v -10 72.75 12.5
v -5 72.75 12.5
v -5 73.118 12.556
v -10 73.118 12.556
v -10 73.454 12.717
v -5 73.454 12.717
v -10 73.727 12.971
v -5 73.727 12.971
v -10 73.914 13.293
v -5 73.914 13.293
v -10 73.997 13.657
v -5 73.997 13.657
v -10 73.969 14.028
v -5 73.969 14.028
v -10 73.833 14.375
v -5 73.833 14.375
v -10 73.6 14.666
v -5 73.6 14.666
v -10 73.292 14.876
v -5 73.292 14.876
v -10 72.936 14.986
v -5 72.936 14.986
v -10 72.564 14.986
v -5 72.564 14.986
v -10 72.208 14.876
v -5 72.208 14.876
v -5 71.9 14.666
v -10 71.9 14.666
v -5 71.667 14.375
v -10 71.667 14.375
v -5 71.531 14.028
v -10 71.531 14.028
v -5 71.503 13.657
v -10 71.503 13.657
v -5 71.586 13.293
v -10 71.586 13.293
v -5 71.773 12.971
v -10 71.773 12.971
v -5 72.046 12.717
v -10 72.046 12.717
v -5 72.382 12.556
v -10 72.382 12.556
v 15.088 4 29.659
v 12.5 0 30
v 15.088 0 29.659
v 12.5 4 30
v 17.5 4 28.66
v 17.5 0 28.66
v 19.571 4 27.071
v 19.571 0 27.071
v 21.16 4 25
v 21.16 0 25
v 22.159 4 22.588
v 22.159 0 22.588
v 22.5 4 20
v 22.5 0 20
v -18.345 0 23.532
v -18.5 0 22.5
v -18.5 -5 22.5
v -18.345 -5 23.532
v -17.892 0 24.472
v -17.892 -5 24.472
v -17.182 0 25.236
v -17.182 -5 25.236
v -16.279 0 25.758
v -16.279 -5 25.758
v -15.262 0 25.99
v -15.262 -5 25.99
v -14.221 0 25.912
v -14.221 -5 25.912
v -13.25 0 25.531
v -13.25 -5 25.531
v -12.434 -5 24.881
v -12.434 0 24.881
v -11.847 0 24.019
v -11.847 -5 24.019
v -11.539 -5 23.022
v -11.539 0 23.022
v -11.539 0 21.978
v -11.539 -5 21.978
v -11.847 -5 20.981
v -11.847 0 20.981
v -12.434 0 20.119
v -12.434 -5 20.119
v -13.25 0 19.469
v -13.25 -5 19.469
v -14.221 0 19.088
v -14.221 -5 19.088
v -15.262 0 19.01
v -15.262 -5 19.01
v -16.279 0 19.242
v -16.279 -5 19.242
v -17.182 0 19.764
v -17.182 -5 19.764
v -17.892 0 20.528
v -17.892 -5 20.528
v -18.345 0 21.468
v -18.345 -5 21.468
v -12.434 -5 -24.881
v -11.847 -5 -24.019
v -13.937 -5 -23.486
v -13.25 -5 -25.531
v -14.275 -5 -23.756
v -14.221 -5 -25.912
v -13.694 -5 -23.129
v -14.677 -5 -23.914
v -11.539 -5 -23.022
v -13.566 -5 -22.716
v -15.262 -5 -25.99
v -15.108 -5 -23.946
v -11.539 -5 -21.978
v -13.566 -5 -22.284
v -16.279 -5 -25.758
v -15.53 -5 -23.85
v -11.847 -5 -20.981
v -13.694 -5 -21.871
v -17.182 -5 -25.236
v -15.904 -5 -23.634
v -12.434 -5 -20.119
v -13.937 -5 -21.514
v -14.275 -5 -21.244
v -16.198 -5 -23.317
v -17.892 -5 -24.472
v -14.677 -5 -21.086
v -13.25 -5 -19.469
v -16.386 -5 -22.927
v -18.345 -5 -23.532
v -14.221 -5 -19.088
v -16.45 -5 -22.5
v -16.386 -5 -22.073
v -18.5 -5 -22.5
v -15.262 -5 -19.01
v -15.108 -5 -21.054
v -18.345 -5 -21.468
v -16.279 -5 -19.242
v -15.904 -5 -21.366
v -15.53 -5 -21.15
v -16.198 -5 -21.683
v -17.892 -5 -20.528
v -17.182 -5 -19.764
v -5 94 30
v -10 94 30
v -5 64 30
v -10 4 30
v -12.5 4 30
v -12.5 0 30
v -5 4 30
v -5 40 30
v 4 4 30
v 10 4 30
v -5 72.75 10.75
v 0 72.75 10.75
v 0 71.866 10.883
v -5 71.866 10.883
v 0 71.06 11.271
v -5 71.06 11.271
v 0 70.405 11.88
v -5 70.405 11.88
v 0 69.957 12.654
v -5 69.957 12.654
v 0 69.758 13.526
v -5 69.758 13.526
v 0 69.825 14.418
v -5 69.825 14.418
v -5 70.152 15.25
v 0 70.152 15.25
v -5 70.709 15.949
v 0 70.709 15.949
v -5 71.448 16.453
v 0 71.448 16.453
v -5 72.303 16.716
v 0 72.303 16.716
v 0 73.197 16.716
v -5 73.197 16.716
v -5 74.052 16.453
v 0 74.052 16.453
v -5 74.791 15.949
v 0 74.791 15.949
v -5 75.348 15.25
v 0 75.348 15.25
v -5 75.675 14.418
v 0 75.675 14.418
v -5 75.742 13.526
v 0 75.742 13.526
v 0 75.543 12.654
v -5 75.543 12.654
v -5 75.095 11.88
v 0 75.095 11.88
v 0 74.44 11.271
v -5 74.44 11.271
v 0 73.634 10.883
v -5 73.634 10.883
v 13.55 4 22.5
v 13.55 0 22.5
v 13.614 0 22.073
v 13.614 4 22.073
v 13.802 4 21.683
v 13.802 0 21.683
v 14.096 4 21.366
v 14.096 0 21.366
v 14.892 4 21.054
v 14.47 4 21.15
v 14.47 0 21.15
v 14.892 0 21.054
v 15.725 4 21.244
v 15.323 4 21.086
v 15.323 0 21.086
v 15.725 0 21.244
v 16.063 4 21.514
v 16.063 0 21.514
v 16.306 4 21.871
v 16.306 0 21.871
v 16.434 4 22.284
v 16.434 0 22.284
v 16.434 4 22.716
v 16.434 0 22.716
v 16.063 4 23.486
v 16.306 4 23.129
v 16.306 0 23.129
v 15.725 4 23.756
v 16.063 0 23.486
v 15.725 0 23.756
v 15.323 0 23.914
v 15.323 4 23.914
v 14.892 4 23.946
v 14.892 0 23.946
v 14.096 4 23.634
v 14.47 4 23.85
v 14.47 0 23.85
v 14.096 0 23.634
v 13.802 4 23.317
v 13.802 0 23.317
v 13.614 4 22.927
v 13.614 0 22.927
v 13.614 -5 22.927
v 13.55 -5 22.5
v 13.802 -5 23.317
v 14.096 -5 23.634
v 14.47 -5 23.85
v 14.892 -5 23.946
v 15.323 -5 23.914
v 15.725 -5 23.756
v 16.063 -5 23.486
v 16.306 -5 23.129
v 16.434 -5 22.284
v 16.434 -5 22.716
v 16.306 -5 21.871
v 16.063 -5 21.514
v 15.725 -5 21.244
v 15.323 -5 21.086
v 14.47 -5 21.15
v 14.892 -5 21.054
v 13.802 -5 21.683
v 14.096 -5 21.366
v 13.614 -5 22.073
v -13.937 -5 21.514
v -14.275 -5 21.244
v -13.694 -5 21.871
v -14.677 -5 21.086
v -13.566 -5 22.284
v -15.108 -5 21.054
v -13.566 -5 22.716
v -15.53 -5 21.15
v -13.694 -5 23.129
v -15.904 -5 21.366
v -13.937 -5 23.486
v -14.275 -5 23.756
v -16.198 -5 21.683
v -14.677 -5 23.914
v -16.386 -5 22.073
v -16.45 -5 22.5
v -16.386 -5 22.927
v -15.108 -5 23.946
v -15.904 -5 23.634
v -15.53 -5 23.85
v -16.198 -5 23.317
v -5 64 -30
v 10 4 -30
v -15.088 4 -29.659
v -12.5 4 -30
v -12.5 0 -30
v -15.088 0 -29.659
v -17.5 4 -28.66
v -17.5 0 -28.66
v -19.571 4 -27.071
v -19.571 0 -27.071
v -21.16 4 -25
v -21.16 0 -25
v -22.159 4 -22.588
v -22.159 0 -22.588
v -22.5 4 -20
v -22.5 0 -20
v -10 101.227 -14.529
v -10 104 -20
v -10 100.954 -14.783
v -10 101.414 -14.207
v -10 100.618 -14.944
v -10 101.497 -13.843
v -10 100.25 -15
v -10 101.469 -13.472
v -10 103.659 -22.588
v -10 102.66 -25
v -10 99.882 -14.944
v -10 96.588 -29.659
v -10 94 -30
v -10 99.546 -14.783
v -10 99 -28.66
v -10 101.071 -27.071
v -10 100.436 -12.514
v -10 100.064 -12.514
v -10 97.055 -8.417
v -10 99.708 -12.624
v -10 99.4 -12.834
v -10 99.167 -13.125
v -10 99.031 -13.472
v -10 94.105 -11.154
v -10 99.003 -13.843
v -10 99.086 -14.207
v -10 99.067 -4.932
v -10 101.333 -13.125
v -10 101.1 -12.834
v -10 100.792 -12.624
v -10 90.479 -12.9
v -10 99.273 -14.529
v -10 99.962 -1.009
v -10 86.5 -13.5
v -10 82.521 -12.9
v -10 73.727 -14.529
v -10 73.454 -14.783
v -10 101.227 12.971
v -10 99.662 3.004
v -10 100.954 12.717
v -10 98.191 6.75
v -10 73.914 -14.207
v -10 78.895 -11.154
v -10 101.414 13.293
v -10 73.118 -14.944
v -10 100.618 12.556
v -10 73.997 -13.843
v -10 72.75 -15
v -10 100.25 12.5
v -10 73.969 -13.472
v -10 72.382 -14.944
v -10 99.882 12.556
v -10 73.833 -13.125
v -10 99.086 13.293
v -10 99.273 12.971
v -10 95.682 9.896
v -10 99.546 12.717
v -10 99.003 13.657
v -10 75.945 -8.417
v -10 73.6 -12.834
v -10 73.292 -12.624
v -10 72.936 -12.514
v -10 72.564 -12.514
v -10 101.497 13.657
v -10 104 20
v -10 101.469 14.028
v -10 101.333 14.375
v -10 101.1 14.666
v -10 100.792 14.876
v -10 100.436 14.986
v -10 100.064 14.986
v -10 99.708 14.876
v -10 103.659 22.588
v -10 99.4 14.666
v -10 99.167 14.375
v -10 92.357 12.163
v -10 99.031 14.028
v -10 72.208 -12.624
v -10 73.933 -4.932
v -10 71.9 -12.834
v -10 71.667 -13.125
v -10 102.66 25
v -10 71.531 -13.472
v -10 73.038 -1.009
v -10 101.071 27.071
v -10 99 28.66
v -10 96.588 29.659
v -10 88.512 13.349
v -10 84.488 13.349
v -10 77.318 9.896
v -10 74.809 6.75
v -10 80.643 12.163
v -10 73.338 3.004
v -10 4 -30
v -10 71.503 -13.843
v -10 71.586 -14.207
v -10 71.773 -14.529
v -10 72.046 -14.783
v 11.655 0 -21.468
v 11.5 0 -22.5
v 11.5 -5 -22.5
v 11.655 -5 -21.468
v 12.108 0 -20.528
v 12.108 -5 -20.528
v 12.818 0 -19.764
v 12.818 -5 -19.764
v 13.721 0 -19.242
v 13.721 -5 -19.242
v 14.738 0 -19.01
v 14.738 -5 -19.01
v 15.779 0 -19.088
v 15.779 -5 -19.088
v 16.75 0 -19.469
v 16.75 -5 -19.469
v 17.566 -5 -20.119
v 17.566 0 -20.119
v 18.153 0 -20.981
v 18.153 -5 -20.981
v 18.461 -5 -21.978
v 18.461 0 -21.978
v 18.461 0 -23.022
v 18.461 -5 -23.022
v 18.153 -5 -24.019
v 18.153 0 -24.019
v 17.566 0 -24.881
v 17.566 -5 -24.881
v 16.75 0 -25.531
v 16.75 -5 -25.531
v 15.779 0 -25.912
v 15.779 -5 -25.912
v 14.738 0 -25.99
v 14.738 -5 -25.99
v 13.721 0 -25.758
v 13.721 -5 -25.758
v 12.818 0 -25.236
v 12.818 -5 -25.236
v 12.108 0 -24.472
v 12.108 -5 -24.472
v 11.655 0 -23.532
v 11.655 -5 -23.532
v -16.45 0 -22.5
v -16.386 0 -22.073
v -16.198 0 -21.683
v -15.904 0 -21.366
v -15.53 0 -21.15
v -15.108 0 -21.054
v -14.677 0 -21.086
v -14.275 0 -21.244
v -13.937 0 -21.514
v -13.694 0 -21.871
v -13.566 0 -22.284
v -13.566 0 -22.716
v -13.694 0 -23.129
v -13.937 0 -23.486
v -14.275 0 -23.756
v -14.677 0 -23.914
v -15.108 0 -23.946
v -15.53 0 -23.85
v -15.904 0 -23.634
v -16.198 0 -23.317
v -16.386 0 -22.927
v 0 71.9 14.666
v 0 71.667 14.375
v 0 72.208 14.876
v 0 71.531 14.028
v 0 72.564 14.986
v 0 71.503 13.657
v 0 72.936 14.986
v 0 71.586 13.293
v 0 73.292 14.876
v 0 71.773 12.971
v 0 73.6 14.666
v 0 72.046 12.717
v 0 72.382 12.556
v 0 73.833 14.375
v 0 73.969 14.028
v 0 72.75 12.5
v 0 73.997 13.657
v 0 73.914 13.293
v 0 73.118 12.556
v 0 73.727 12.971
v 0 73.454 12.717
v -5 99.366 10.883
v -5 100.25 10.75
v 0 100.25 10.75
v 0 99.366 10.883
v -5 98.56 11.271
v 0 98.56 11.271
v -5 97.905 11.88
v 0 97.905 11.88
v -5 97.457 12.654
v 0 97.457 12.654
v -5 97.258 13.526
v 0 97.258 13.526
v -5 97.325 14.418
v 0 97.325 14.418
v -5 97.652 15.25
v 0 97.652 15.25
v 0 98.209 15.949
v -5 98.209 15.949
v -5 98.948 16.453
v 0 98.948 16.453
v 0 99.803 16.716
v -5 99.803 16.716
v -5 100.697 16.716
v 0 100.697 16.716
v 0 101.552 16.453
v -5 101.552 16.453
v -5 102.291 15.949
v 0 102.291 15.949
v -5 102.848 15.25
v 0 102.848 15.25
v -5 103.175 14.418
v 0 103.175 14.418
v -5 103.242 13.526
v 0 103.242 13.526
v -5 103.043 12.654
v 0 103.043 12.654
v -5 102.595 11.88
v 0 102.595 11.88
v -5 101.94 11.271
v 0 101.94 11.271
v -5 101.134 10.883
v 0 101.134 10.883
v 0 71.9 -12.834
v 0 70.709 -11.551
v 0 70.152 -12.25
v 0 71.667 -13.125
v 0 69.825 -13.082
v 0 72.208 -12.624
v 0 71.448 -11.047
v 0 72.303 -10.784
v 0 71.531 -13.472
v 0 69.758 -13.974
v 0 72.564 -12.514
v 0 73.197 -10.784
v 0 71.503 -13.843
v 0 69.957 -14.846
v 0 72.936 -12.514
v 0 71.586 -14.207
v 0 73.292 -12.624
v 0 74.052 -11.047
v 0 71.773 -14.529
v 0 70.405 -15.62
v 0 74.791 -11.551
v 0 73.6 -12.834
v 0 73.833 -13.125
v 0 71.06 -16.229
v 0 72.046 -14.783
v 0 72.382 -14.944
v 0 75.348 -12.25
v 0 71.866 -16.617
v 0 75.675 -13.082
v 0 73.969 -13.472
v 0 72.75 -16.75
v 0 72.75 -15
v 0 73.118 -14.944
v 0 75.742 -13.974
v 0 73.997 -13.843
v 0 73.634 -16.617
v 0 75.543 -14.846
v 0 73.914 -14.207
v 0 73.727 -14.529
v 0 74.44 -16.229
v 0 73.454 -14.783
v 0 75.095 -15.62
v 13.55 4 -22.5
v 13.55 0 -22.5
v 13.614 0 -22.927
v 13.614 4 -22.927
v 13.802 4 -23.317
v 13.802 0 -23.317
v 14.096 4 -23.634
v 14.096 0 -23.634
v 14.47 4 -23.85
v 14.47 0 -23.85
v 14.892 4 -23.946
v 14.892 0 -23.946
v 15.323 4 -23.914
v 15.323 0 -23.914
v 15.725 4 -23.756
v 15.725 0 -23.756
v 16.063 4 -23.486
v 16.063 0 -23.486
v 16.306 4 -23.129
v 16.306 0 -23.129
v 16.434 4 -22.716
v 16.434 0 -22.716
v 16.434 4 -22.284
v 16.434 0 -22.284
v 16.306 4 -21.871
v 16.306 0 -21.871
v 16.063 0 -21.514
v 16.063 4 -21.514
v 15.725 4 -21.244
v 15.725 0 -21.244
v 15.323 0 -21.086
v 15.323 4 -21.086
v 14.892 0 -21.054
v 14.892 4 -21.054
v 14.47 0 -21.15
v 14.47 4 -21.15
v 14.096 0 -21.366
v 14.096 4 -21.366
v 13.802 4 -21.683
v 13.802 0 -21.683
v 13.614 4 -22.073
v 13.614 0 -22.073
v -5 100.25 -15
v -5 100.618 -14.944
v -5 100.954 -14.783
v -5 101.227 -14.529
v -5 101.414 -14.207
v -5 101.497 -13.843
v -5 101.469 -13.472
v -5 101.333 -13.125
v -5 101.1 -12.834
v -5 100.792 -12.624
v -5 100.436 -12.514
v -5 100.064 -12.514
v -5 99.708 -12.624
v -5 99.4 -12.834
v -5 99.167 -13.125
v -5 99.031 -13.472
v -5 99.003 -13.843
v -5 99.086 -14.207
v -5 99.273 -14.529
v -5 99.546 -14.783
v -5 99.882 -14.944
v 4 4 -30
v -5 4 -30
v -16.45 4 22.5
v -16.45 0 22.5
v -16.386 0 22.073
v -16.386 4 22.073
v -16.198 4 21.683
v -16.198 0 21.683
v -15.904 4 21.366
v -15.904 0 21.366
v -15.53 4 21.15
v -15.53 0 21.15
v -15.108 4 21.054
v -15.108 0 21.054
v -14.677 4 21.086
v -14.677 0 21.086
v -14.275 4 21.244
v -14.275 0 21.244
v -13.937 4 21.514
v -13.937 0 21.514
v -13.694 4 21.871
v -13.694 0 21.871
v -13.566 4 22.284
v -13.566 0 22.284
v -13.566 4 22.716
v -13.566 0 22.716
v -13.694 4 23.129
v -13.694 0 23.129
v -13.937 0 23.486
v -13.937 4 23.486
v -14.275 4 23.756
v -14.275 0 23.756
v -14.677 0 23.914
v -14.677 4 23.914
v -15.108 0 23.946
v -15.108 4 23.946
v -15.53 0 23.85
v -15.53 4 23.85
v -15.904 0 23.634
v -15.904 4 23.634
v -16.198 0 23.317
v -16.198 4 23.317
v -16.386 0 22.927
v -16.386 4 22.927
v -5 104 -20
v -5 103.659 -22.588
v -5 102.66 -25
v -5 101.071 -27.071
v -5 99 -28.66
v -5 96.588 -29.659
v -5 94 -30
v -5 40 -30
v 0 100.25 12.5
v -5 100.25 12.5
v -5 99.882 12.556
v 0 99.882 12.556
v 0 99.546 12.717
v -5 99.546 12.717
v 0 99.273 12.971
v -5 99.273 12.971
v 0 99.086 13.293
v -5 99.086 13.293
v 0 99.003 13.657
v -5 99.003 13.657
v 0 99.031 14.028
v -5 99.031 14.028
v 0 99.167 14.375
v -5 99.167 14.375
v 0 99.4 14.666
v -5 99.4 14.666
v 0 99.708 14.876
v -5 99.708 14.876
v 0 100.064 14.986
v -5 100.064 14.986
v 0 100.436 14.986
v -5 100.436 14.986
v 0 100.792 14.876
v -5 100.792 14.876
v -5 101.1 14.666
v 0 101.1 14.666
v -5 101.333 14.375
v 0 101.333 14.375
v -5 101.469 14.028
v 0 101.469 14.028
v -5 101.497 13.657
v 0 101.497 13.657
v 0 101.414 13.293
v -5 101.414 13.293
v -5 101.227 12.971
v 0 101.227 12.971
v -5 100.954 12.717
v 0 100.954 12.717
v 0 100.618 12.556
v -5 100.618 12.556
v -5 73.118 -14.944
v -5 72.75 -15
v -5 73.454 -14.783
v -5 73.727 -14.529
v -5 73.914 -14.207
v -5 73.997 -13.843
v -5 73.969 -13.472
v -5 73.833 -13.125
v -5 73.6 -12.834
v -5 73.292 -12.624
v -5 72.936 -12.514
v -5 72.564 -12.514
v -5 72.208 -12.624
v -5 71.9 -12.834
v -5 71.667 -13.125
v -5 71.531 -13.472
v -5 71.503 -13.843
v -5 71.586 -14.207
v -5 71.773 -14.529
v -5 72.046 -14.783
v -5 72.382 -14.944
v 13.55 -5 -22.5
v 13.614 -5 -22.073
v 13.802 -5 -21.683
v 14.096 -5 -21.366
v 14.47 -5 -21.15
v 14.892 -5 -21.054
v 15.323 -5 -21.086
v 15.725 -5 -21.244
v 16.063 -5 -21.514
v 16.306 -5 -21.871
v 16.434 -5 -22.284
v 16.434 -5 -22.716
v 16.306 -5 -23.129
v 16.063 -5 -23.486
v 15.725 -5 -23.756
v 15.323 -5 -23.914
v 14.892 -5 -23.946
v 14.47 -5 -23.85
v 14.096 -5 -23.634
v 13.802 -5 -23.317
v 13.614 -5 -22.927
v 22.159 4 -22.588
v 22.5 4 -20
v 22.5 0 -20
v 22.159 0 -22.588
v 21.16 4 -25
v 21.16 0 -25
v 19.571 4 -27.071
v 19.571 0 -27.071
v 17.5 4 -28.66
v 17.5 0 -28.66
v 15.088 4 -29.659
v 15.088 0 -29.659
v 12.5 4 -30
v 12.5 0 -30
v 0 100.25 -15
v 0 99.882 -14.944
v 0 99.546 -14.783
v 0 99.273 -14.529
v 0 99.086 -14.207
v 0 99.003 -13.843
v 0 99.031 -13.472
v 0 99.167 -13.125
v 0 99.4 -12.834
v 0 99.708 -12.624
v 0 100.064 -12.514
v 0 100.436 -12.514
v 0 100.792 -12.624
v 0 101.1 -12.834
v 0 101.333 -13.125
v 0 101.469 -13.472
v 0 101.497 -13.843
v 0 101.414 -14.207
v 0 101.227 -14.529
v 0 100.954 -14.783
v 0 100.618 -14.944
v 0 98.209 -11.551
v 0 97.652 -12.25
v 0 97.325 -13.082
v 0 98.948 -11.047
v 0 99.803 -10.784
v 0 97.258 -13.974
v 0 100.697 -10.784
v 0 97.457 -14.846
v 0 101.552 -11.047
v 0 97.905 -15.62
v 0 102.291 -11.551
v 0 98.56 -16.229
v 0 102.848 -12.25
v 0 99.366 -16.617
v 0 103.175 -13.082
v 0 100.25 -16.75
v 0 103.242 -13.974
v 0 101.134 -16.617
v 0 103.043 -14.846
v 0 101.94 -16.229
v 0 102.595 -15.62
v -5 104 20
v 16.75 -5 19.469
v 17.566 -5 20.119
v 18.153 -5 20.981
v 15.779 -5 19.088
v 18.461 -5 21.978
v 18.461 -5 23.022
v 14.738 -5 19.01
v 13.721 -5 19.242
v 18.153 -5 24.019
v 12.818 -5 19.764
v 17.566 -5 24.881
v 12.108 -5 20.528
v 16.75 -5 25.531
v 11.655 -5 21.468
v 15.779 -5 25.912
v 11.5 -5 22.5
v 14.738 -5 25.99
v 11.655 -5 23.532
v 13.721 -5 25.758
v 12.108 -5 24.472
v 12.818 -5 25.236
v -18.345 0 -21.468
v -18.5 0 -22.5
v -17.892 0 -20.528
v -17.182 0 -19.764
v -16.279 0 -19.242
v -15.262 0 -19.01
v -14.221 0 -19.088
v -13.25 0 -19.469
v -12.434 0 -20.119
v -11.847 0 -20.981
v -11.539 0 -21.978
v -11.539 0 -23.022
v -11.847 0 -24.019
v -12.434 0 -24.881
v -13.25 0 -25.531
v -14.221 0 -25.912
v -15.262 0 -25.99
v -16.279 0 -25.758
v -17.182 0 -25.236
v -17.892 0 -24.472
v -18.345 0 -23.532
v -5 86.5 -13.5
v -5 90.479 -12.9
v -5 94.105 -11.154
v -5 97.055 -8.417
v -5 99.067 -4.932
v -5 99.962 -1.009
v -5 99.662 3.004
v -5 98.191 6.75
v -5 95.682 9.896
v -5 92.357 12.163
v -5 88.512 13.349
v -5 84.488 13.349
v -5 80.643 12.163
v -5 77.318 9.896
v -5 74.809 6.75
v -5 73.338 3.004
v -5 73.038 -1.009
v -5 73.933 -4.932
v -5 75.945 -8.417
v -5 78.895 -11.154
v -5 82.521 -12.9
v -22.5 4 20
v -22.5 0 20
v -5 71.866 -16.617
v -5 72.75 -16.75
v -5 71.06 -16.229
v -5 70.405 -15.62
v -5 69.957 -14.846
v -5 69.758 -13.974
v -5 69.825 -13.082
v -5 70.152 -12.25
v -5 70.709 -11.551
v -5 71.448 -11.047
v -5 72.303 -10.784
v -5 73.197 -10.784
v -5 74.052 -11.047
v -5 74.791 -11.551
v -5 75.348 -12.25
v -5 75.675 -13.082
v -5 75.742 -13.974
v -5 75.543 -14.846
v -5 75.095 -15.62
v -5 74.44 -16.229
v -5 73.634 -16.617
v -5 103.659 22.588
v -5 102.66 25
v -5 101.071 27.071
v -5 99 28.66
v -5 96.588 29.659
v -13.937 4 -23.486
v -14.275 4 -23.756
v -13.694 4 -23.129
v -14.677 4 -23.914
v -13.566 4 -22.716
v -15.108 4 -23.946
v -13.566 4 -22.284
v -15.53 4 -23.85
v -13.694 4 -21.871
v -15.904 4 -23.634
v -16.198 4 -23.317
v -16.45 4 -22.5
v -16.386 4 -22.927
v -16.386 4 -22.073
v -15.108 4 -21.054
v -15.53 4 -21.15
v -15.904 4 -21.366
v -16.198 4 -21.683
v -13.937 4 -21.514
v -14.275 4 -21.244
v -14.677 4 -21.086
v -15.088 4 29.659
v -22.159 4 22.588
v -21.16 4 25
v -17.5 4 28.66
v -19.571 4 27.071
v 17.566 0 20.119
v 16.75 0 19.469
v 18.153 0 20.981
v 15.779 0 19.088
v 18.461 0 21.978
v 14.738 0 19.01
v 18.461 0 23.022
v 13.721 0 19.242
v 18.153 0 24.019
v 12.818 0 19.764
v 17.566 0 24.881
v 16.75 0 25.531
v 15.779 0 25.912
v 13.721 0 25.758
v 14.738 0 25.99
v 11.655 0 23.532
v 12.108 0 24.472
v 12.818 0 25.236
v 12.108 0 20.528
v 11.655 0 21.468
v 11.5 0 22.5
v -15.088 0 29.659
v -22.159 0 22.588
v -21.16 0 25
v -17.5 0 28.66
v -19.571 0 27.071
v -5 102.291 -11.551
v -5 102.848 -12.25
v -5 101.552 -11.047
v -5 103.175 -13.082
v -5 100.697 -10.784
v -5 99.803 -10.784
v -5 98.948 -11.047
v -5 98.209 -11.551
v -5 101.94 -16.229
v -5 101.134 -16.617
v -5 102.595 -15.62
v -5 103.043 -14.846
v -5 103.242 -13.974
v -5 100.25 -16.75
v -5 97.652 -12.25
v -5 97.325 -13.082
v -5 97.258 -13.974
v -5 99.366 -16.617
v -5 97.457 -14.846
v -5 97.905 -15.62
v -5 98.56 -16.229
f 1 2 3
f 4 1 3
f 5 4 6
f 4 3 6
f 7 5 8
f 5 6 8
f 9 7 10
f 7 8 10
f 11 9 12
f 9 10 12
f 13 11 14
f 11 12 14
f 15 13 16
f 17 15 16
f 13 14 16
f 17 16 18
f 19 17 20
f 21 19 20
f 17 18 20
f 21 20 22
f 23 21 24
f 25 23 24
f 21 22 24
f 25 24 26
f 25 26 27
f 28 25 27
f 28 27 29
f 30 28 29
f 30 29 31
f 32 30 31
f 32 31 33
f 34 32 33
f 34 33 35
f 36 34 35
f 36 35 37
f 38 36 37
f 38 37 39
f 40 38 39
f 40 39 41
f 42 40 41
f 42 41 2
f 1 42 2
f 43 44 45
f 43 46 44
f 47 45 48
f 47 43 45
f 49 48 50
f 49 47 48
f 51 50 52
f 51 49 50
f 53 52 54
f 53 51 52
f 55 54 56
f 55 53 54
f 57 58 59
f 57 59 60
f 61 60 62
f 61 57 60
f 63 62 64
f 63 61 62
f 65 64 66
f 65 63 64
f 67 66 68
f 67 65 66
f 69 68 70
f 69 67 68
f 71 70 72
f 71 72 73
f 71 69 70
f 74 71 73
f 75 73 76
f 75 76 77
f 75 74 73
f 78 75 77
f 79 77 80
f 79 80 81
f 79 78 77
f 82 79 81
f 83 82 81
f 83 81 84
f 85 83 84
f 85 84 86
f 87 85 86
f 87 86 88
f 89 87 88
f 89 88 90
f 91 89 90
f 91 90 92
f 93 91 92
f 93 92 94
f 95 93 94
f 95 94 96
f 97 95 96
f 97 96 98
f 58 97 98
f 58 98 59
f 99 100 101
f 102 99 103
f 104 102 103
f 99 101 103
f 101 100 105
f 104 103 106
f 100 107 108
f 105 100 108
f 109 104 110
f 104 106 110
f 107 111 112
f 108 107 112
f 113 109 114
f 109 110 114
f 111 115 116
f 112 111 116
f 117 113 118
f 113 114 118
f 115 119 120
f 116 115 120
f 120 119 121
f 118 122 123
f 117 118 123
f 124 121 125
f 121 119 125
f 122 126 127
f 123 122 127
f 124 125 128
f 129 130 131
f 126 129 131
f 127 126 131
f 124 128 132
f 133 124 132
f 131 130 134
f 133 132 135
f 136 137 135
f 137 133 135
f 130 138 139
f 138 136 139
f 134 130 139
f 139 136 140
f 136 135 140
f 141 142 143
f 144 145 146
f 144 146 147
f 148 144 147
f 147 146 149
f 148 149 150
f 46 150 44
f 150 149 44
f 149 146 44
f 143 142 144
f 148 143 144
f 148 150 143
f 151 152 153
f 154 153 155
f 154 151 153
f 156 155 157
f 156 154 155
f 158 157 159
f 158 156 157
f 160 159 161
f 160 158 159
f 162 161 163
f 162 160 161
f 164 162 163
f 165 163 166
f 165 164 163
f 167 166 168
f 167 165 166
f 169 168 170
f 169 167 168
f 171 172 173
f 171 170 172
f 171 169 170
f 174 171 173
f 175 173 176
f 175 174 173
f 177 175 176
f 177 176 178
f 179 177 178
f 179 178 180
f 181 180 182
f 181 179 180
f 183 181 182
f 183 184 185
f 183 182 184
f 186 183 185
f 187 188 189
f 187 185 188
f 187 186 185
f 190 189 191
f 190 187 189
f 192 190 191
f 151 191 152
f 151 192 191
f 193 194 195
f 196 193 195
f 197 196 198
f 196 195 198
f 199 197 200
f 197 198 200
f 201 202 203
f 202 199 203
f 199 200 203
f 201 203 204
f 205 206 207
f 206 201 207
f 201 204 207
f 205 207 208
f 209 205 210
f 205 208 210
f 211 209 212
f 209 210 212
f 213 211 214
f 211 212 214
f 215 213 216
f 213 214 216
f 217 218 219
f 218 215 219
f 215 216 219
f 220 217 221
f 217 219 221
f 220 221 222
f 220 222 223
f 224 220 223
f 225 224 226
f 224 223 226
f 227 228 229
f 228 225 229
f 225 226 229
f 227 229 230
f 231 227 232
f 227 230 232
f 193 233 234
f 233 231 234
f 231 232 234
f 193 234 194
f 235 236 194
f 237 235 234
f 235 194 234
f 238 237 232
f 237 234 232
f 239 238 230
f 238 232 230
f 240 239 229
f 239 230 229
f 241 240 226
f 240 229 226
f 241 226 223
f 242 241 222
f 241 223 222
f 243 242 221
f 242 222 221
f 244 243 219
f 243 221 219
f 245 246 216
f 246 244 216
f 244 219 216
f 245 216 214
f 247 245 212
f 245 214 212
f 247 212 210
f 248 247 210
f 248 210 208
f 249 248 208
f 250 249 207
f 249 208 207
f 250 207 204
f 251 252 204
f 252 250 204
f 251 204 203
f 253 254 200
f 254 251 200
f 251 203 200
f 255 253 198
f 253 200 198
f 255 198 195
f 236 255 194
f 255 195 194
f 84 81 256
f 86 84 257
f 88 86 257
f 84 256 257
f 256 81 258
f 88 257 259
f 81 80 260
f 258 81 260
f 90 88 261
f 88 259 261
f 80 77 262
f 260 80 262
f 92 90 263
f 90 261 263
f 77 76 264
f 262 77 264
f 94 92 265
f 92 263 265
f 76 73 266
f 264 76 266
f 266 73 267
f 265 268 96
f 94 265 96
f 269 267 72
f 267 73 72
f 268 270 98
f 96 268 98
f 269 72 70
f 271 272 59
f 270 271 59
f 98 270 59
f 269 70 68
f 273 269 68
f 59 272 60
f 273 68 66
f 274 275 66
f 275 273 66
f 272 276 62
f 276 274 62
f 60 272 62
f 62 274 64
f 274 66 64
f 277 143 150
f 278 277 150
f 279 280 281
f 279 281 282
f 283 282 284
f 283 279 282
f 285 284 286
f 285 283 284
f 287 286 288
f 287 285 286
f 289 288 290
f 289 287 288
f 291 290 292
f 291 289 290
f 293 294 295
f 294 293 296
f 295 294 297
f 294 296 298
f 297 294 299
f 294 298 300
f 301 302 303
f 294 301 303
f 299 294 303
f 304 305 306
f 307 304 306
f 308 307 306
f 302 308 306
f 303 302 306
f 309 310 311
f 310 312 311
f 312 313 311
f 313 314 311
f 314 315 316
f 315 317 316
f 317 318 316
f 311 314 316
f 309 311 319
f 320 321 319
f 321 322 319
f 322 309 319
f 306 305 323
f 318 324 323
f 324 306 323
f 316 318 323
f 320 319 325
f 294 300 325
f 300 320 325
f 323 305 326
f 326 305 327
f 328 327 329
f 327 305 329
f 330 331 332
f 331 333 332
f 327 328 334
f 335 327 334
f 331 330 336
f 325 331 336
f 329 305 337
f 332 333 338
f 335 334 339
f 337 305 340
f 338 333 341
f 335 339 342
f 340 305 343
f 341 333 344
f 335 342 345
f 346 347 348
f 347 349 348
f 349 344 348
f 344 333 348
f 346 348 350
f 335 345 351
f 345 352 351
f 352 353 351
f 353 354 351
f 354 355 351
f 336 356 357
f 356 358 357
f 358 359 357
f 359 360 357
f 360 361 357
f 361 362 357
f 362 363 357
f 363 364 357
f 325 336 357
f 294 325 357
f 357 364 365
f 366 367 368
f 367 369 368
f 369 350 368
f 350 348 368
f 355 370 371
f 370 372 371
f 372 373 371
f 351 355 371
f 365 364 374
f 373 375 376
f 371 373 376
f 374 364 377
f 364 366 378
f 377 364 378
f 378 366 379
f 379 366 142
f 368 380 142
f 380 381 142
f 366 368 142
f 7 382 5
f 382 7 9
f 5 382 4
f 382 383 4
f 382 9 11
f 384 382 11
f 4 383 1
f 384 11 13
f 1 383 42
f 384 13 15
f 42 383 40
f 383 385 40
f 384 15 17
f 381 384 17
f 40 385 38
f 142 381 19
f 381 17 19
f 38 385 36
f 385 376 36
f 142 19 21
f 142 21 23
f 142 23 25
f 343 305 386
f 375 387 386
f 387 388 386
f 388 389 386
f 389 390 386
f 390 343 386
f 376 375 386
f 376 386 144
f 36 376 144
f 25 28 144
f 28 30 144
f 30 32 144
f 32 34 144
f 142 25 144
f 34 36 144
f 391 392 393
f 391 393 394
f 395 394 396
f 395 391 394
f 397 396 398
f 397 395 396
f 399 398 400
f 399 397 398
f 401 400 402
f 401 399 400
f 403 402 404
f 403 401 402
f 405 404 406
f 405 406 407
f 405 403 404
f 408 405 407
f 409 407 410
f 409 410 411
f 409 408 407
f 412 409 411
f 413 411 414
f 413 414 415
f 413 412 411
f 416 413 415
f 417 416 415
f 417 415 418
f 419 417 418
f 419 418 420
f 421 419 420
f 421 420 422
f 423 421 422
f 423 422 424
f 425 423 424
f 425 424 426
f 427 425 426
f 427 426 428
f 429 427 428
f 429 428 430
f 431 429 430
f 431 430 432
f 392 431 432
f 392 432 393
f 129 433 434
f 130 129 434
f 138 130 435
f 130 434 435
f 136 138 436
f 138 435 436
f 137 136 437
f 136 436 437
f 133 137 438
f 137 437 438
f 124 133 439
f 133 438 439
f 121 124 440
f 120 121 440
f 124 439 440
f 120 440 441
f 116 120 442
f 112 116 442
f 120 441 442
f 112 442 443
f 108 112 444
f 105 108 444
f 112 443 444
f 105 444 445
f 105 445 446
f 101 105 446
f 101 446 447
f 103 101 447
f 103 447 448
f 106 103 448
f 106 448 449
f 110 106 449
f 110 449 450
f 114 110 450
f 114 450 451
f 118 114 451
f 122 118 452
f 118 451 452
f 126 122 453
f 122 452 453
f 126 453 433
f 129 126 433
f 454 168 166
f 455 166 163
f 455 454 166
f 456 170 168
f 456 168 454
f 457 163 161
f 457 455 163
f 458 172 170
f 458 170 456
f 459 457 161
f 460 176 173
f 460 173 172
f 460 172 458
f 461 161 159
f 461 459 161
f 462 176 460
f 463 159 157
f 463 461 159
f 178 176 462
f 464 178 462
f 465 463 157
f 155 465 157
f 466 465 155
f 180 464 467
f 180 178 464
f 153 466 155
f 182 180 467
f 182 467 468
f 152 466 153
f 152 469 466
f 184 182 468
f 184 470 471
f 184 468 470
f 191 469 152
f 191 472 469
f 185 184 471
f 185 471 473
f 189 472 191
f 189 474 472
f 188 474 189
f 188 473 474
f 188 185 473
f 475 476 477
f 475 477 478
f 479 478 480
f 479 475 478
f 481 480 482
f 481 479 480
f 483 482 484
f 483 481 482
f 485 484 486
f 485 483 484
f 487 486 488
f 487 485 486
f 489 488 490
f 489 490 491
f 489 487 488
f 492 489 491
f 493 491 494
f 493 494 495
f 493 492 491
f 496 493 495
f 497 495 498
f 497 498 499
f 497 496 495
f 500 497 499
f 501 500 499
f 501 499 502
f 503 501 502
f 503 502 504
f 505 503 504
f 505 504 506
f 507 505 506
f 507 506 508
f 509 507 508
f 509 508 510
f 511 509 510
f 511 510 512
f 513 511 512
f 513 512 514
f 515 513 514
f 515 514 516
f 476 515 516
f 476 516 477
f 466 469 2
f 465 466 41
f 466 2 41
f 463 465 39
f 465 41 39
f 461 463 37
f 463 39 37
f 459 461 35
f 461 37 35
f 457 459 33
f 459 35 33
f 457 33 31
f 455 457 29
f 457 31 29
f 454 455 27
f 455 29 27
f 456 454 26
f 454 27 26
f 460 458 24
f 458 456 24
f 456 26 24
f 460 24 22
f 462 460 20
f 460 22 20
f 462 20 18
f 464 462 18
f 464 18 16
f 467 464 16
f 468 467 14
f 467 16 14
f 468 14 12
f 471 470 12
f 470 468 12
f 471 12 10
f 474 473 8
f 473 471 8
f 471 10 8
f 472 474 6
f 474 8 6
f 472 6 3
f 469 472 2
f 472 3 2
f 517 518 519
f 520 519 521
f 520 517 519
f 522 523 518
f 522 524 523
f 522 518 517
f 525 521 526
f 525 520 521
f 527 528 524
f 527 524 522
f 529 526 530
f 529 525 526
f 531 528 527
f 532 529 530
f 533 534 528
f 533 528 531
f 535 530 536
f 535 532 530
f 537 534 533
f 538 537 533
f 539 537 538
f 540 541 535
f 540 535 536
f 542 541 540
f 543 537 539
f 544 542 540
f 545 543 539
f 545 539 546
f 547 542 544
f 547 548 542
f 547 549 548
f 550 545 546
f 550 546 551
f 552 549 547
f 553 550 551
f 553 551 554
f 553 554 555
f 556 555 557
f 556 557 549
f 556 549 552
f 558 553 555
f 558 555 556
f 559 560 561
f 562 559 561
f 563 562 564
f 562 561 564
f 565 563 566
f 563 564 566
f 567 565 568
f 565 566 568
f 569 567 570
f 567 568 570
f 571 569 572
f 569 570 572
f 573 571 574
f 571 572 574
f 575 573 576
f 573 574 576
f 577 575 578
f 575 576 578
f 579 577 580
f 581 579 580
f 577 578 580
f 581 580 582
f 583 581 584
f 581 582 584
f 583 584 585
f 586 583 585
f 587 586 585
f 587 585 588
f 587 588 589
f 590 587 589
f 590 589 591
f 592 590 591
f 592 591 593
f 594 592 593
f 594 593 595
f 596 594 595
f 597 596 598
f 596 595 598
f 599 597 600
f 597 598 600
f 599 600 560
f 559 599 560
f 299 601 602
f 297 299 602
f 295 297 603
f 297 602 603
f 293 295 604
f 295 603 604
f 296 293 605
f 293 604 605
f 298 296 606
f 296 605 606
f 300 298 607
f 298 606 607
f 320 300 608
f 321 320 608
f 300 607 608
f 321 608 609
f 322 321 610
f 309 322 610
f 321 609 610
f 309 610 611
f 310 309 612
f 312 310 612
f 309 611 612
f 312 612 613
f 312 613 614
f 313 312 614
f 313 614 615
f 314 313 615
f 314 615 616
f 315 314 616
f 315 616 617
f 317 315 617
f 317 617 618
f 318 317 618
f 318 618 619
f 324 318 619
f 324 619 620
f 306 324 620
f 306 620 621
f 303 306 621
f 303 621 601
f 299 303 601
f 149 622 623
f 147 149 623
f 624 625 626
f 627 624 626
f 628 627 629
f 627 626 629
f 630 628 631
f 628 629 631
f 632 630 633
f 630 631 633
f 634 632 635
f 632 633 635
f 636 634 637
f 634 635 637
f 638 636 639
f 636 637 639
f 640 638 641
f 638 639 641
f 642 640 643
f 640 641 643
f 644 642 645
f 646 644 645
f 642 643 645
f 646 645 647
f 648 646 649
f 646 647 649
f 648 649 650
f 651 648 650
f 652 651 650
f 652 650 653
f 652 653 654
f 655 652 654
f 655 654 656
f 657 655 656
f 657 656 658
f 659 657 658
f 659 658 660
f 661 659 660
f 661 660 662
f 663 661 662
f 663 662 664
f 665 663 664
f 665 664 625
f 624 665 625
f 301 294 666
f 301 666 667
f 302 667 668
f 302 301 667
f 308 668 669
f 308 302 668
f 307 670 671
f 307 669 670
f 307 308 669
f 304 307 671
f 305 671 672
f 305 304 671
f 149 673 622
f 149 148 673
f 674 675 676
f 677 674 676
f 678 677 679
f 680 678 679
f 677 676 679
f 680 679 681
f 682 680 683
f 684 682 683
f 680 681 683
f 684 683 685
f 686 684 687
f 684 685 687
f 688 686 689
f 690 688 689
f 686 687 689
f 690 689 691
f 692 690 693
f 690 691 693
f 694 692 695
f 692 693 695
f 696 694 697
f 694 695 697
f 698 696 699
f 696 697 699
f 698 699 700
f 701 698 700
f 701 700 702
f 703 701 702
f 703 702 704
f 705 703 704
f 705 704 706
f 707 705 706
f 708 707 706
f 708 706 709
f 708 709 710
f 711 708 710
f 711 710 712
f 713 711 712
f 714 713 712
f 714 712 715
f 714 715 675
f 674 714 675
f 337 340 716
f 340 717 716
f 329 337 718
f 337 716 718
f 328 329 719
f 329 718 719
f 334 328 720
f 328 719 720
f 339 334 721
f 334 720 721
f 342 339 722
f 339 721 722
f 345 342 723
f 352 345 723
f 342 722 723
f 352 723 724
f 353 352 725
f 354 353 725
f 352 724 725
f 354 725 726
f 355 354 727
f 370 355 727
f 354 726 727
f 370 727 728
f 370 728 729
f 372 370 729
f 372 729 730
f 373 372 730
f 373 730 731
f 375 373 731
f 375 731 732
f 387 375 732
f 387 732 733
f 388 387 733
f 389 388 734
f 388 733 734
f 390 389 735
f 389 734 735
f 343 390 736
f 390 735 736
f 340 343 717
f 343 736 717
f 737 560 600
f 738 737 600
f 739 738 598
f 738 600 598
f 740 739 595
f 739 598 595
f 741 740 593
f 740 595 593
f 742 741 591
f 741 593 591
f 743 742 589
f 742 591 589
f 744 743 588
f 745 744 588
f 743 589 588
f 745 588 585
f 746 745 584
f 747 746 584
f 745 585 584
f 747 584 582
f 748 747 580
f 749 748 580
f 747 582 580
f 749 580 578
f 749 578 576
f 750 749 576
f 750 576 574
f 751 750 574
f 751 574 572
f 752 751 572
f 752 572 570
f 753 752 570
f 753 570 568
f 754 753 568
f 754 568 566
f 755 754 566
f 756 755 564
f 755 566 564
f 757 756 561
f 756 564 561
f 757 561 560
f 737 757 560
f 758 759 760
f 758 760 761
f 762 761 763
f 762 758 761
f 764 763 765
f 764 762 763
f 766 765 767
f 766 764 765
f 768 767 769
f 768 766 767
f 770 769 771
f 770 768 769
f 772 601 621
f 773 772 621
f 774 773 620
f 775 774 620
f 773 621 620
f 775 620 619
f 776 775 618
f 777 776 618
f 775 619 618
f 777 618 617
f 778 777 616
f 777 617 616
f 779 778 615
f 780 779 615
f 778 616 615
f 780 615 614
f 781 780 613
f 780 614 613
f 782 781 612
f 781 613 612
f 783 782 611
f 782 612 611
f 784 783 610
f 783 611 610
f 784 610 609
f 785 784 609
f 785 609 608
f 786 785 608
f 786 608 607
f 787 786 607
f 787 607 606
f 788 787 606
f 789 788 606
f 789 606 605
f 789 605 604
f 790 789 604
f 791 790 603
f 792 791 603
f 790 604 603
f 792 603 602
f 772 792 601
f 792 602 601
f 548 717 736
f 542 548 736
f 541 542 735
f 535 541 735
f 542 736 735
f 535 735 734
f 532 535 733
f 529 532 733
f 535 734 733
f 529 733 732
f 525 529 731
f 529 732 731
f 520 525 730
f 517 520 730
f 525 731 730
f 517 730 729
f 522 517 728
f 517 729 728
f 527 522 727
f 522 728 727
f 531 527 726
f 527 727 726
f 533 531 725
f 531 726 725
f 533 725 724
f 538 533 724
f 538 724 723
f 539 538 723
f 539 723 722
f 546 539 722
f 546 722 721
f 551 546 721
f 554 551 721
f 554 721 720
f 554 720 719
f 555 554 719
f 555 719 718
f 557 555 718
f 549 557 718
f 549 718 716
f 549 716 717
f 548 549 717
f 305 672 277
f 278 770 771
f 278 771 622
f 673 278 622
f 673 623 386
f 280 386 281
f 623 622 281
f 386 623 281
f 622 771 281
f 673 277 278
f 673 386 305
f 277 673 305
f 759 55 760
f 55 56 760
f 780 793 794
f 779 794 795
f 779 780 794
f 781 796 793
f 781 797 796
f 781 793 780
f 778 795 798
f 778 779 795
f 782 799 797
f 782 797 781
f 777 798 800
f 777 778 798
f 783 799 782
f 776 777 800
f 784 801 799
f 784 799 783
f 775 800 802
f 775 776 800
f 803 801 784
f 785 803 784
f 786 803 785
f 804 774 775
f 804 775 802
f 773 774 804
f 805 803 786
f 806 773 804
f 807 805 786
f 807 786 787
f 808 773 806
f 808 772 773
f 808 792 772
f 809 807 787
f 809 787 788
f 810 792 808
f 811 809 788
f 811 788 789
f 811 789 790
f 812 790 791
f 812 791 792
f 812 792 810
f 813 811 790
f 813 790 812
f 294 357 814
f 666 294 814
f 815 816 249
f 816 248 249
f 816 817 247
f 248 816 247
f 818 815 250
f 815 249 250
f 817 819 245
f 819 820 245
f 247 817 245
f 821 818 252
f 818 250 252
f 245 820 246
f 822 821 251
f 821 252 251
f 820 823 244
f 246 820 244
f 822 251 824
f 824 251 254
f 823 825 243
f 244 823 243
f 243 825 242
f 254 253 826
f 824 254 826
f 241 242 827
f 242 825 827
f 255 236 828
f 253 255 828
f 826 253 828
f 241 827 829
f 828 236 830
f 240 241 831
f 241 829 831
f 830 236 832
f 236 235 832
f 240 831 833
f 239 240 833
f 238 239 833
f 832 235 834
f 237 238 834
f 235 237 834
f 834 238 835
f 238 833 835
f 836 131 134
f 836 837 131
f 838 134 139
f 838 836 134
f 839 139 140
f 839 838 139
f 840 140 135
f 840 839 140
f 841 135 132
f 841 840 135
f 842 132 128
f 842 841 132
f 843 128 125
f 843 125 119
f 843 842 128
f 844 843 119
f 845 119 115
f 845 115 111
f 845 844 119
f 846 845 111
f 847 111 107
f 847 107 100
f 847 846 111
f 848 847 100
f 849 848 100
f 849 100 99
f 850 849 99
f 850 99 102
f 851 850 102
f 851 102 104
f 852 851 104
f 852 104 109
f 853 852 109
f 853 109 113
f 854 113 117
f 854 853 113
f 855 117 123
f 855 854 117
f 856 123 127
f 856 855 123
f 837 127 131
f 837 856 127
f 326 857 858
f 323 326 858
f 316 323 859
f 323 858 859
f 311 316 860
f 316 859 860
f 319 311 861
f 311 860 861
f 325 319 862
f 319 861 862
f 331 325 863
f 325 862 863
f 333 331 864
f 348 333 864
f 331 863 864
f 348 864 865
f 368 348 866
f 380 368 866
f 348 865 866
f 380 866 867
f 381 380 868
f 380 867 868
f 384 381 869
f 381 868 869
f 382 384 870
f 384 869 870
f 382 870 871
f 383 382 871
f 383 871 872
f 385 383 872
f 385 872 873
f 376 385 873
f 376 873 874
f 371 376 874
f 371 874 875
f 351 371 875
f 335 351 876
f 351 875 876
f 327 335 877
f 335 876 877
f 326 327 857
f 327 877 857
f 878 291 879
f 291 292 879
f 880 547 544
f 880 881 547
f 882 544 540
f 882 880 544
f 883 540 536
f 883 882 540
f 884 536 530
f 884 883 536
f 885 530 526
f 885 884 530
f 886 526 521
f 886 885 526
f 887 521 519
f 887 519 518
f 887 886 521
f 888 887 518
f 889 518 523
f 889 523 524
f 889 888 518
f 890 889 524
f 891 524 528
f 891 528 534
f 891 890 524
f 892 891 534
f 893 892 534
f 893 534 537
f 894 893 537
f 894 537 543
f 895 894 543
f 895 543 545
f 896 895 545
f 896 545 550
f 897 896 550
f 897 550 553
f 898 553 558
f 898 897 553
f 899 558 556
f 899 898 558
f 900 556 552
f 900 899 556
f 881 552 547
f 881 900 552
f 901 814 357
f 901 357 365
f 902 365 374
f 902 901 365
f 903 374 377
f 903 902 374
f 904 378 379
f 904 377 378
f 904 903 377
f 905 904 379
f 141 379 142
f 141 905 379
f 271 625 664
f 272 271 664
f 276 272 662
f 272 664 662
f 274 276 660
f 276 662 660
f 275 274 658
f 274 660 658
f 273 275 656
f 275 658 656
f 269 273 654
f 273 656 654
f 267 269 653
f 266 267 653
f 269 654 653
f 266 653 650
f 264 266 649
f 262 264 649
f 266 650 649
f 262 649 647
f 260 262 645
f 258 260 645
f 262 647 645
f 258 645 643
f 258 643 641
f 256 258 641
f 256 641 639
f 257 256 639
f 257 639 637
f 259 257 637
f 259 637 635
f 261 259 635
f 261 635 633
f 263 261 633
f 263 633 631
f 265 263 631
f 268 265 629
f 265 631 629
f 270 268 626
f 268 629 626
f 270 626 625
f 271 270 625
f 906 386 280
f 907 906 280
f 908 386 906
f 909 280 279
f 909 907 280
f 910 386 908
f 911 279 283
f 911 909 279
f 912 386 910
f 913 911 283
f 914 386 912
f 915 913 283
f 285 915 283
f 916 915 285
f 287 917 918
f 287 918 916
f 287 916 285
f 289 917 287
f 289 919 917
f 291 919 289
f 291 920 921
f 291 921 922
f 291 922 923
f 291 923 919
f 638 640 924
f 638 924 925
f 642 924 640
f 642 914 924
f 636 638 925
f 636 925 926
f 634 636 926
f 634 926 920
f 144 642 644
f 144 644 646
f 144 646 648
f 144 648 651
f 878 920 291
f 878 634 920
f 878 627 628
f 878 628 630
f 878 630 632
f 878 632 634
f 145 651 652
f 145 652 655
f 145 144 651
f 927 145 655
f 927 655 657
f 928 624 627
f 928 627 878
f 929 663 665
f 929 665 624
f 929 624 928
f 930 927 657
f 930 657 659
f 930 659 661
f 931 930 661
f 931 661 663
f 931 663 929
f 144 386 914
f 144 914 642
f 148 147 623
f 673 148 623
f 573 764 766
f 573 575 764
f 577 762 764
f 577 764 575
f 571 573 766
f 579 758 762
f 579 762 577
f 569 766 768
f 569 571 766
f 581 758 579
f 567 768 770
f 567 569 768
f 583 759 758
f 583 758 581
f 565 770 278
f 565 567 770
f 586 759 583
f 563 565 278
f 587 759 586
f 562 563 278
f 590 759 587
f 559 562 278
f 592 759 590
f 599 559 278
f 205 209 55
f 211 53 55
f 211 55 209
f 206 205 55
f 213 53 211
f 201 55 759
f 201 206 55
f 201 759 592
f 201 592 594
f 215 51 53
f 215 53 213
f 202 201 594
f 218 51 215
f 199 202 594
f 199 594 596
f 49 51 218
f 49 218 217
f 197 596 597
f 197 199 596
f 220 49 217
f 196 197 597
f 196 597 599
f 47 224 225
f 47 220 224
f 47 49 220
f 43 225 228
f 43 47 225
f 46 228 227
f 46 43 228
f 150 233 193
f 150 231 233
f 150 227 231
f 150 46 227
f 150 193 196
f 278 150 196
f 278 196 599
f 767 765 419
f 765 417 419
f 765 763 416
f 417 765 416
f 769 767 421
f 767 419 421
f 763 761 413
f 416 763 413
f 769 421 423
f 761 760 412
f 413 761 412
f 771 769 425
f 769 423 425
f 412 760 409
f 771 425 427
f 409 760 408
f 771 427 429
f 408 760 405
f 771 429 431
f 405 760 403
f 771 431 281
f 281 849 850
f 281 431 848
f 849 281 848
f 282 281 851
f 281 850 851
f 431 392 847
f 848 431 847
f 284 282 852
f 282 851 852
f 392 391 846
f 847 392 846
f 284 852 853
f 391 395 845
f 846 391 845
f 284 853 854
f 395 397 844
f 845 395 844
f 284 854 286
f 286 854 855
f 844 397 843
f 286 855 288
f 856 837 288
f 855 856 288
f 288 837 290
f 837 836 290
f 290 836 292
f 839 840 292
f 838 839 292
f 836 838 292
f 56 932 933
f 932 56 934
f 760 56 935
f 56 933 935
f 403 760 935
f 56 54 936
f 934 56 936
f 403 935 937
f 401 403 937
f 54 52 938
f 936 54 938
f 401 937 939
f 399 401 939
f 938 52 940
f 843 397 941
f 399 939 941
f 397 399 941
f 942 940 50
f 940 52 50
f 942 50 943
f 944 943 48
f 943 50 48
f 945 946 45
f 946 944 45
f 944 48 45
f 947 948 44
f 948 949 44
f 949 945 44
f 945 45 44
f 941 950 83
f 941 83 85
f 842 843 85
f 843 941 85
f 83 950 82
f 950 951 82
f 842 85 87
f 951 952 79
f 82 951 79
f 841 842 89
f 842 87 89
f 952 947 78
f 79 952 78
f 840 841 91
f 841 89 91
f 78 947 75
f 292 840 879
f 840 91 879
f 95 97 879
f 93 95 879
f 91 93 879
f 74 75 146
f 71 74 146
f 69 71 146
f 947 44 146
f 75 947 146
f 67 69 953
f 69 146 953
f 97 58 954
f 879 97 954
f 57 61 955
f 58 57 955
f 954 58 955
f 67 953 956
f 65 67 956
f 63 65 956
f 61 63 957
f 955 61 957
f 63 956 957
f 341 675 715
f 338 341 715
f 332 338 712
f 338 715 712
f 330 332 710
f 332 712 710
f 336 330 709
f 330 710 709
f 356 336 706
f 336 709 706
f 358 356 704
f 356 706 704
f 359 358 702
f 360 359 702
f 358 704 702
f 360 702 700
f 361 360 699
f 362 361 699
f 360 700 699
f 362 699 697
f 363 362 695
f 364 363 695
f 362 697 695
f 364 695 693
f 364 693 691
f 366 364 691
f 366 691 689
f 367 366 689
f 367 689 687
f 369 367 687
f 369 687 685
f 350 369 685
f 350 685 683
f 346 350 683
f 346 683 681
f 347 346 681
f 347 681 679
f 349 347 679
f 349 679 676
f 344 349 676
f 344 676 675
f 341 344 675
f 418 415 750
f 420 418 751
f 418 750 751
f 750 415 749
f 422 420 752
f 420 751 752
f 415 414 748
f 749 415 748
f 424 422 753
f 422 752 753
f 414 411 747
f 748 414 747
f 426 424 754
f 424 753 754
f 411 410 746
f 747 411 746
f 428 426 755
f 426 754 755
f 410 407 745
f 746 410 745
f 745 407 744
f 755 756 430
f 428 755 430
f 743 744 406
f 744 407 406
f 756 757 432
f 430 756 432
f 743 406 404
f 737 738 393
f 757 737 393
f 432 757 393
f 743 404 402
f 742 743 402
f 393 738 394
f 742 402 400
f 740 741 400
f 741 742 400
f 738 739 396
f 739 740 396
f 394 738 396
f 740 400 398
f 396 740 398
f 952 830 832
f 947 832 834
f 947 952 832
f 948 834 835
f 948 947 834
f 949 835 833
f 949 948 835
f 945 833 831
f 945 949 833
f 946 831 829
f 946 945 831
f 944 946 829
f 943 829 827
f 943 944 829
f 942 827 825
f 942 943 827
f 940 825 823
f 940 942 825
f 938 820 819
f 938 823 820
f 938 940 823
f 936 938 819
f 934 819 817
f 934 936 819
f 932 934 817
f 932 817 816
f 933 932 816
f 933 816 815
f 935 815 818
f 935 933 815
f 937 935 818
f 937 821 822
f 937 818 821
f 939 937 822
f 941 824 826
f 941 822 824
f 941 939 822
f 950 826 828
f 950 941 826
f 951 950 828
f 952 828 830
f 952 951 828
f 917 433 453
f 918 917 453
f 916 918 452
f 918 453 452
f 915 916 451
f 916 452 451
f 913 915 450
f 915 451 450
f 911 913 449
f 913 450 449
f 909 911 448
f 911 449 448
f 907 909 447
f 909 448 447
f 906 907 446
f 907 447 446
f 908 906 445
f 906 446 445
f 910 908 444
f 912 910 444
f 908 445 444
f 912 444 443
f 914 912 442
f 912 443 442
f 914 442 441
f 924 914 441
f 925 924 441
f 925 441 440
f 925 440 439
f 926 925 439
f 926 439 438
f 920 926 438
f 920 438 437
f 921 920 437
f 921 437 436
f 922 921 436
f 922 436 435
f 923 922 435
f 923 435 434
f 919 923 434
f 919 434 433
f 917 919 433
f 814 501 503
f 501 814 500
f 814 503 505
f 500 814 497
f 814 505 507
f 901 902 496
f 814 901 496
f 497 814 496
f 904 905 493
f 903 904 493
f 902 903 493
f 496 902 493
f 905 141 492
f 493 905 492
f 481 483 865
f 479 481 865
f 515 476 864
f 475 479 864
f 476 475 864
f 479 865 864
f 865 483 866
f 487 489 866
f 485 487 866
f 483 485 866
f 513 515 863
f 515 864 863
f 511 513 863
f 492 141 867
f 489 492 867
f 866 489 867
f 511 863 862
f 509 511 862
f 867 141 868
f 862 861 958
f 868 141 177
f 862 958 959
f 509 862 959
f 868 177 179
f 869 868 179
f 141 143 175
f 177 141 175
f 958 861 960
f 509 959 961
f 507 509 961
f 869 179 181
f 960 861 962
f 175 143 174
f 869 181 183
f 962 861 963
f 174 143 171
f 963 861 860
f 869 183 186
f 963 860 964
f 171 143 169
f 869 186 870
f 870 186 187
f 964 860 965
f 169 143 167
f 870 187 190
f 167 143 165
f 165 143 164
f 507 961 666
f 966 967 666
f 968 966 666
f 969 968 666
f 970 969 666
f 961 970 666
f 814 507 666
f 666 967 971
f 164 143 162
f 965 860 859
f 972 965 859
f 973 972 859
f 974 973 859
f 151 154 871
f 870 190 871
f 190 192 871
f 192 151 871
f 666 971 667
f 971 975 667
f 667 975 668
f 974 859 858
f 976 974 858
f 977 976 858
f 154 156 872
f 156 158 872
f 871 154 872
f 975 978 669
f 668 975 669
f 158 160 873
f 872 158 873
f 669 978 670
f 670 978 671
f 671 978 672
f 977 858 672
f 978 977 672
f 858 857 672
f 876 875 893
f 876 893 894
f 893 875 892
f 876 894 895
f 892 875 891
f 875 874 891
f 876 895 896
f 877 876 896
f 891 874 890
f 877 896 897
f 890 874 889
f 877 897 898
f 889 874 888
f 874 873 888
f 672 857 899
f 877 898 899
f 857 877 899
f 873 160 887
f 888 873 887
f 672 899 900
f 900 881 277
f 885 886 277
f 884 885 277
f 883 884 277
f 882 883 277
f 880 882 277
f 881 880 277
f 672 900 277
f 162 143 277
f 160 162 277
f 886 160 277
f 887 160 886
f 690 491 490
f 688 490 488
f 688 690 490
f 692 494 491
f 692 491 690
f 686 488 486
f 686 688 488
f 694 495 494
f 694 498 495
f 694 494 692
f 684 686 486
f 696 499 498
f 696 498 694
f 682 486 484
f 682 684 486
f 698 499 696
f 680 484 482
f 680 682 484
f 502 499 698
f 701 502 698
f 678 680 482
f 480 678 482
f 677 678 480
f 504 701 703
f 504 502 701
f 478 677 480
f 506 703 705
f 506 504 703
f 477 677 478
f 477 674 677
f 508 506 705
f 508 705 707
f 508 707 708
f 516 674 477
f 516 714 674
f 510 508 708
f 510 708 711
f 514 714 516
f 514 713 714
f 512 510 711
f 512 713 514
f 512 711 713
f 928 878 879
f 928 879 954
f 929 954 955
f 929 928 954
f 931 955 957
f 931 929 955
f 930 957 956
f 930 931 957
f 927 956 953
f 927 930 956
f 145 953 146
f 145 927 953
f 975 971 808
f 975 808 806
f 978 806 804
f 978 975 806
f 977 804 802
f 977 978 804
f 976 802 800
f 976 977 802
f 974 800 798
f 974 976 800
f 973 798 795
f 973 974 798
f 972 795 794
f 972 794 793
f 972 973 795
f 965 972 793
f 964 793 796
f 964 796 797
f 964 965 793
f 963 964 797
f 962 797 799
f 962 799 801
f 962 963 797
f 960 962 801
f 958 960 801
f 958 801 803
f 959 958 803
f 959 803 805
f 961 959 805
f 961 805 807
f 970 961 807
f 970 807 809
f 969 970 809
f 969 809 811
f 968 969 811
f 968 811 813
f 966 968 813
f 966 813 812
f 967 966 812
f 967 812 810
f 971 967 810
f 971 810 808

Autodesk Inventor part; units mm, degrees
ref_plane "YZ Plane" through (0, 0, 0) normal (1, 0, 0) x (0, 1, 0)
ref_plane "XZ Plane" through (0, 0, 0) normal (0, 1, 0) x (-1, 0, 0)
ref_plane "XY Plane" through (0, 0, 0) normal (0, 0, 1) x (1, 0, 0)
sketch "Sketch1" plane through (0, 0, 0) normal (0, 1, 0) x (-1, 0, 0)
  line L0 (-15, 22.5) -> (15, 22.5)
  line L1 (15, 22.5) -> (15, -22.5)
  line L2 (15, -22.5) -> (-15, -22.5)
  line L3 (-15, -22.5) -> (-15, 22.5)
  line L4 (-15, 22.5) -> (15, -22.5) construction
  line L5 (15, 22.5) -> (-15, -22.5) construction
  circle A0 centre (15, 22.5) radius 3.5
  circle A1 centre (-15, 22.5) radius 3.5
  circle A2 centre (15, -22.5) radius 3.5
  circle A3 centre (-15, -22.5) radius 3.5
  line L6 (22.5, 30) -> (-22.5, 30)
  line L7 (-22.5, 30) -> (-22.5, -30)
  line L8 (-22.5, -30) -> (22.5, -30)
  line L9 (22.5, -30) -> (22.5, 30)
  line L10 (22.5, 30) -> (-22.5, -30) construction
  line L11 (-22.5, 30) -> (22.5, -30) construction
  circle A4 centre (15, 22.5) radius 1.45
  circle A5 centre (15, -22.5) radius 1.45
  circle A6 centre (-15, 22.5) radius 1.45
  circle A7 centre (-15, -22.5) radius 1.45
  point P0 (0, 0)
  point P1 (-11.5, 22.5)
  point P2 (-15, 19)
  point P3 (-15, -19)
  point P4 (-11.5, -22.5)
  point P5 (11.5, -22.5)
  point P6 (15, -19)
  point P7 (15, 19)
  point P8 (11.5, 22.5)
  dimension "d0" = 45
  dimension "d1" = 30
  dimension "d2" = 7
  dimension "d3" = 7
  dimension "d4" = 7
  dimension "d5" = 7
  dimension "d6" = 7.5
  dimension "d7" = 7.5
  dimension "d8" = 2.9
  dimension "d9" = 2.9
  dimension "d10" = 2.9
  dimension "d11" = 2.9
extrude "Extrusion1" add sketch "Sketch1" against normal blind 5 contours A6 L3 A1 L0 | L0 A1 L3 A6 | A0 L1 A4 L0 | L0 A4 L1 A0 | A3 L2 A7 L3 | L3 A7 L2 A3 | A2 L2 A5 L1 | L1 A5 L2 A2
extrude "Extrusion2" add sketch "Sketch1" along normal blind 4 contours A6 L3 A1 L0 | L0 A1 L3 A6 | L0 A0 L1 A2 L2 A3 L3 A1 | A0 L1 A4 L0 | L0 A4 L1 A0 | A3 L2 A7 L3 | L3 A7 L2 A3 | A2 L2 A5 L1 | L1 A5 L2 A2 | L9 L8 L7 L6
sketch "Sketch2" plane through (0, 4, 0) normal (0, 1, 0) x (1, 0, 0)
  line L0 (-10, -30) -> (-5, -30)
  line L1 (-5, -30) -> (-5, 30)
  line L2 (-5, 30) -> (-10, 30)
  line L3 (-10, 30) -> (-10, -30)
  line L4 (-10, -30) -> (-5, 30) construction
  line L5 (-5, -30) -> (-10, 30) construction
  point P0 (0, 0)
  point P1 (-7.5, 0)
  dimension "d39" = 60
  dimension "d40" = 5
  dimension "d41" = 5
extrude "Extrusion3" add sketch "Sketch2" along normal blind 100
sketch "Sketch3" plane through (-5, 4, 30) normal (1, 0, 0) x (0, 0, -1)
  line L0 (30, 100) -> (30, 82.5)
  line L1 (16.25, 68.75) -> (43.75, 68.75)
  line L2 (43.75, 68.75) -> (43.75, 96.25)
  line L3 (43.75, 96.25) -> (16.25, 96.25)
  line L4 (16.25, 96.25) -> (16.25, 68.75)
  line L5 (16.25, 68.75) -> (43.75, 96.25) construction
  line L6 (43.75, 68.75) -> (16.25, 96.25) construction
  circle A0 centre (16.25, 96.25) radius 1.25
  circle A1 centre (43.75, 96.25) radius 1.25
  circle A2 centre (16.25, 68.75) radius 1.25
  circle A3 centre (43.75, 68.75) radius 1.25
  circle A4 centre (30, 82.5) radius 13.5
  circle A5 centre (16.25, 96.25) radius 3
  circle A6 centre (43.75, 96.25) radius 3
  circle A7 centre (16.25, 68.75) radius 3
  circle A8 centre (43.75, 68.75) radius 3
  line L7 (0, 100) -> (60, 100) projected
  line L8 (60, 0) -> (60, 100) projected
  point P0 (30, -4)
  dimension "d19" = 27.5
  dimension "d20" = 27.5
  dimension "d21" = 2.5
  dimension "d22" = 2.5
  dimension "d23" = 2.5
  dimension "d24" = 2.5
  dimension "d26" = 27
  dimension "d27" = 6
  dimension "d28" = 6
  dimension "d29" = 6
  dimension "d30" = 6
  dimension "d42" = 17.5
  dimension "d53" = 30
extrude "Extrusion4" cut sketch "Sketch3" against normal blind 60 contours L4 A2 L1 | L1 A2 L4 | A3 L2 L1 | L1 L2 A3 | A0 L3 L4 | L4 L3 A0 | A1 L3 L2 | L2 L3 A1 | A4
extrude "Extrusion5" add sketch "Sketch3" along normal blind 5 contours A2 L4 A7 L1 | L1 A7 L4 A2 | A8 L2 A3 L1 | L1 A3 L2 A8 | A5 L3 A0 L4 | L4 A0 L3 A5 | A6 L3 A1 L2 | L2 A1 L3 A6
fillet "Fillet1" radius 10 2 edges at (-7.5, 104, -30) (-7.5, 104, 30)
sketch "Sketch6" plane through (-10, 4, 30) normal (0, 0, 1) x (-1, 0, 0)
  line L0 (-5, 0) -> (-5, -90) projected
  line L1 (-5, -60) -> (-20, 0)
  line L2 (12.5, 0) -> (-32.5, 0) projected
  line L3 (-5, -36) -> (-14, 0)
  line L4 (-32.5, 0) -> (12.5, 0) projected
  line L5 (12.5, 4) -> (-32.5, 4) projected
  point P0 (-10, 4)
  point P1 (-10, 0)
  dimension "d50" = 40
  dimension "d52" = 15
  dimension "d54" = 60
extrude "Extrusion7" add sketch "Sketch6" against normal up to surface (60 mm away) contours L0 L1 L2 L3
fillet "Fillet2" radius 10 4 edges at (22.5, 2, 30) (-22.5, 2, 30) (22.5, 2, -30) (-22.5, 2, -30)
properties part number "Camera_holder"
